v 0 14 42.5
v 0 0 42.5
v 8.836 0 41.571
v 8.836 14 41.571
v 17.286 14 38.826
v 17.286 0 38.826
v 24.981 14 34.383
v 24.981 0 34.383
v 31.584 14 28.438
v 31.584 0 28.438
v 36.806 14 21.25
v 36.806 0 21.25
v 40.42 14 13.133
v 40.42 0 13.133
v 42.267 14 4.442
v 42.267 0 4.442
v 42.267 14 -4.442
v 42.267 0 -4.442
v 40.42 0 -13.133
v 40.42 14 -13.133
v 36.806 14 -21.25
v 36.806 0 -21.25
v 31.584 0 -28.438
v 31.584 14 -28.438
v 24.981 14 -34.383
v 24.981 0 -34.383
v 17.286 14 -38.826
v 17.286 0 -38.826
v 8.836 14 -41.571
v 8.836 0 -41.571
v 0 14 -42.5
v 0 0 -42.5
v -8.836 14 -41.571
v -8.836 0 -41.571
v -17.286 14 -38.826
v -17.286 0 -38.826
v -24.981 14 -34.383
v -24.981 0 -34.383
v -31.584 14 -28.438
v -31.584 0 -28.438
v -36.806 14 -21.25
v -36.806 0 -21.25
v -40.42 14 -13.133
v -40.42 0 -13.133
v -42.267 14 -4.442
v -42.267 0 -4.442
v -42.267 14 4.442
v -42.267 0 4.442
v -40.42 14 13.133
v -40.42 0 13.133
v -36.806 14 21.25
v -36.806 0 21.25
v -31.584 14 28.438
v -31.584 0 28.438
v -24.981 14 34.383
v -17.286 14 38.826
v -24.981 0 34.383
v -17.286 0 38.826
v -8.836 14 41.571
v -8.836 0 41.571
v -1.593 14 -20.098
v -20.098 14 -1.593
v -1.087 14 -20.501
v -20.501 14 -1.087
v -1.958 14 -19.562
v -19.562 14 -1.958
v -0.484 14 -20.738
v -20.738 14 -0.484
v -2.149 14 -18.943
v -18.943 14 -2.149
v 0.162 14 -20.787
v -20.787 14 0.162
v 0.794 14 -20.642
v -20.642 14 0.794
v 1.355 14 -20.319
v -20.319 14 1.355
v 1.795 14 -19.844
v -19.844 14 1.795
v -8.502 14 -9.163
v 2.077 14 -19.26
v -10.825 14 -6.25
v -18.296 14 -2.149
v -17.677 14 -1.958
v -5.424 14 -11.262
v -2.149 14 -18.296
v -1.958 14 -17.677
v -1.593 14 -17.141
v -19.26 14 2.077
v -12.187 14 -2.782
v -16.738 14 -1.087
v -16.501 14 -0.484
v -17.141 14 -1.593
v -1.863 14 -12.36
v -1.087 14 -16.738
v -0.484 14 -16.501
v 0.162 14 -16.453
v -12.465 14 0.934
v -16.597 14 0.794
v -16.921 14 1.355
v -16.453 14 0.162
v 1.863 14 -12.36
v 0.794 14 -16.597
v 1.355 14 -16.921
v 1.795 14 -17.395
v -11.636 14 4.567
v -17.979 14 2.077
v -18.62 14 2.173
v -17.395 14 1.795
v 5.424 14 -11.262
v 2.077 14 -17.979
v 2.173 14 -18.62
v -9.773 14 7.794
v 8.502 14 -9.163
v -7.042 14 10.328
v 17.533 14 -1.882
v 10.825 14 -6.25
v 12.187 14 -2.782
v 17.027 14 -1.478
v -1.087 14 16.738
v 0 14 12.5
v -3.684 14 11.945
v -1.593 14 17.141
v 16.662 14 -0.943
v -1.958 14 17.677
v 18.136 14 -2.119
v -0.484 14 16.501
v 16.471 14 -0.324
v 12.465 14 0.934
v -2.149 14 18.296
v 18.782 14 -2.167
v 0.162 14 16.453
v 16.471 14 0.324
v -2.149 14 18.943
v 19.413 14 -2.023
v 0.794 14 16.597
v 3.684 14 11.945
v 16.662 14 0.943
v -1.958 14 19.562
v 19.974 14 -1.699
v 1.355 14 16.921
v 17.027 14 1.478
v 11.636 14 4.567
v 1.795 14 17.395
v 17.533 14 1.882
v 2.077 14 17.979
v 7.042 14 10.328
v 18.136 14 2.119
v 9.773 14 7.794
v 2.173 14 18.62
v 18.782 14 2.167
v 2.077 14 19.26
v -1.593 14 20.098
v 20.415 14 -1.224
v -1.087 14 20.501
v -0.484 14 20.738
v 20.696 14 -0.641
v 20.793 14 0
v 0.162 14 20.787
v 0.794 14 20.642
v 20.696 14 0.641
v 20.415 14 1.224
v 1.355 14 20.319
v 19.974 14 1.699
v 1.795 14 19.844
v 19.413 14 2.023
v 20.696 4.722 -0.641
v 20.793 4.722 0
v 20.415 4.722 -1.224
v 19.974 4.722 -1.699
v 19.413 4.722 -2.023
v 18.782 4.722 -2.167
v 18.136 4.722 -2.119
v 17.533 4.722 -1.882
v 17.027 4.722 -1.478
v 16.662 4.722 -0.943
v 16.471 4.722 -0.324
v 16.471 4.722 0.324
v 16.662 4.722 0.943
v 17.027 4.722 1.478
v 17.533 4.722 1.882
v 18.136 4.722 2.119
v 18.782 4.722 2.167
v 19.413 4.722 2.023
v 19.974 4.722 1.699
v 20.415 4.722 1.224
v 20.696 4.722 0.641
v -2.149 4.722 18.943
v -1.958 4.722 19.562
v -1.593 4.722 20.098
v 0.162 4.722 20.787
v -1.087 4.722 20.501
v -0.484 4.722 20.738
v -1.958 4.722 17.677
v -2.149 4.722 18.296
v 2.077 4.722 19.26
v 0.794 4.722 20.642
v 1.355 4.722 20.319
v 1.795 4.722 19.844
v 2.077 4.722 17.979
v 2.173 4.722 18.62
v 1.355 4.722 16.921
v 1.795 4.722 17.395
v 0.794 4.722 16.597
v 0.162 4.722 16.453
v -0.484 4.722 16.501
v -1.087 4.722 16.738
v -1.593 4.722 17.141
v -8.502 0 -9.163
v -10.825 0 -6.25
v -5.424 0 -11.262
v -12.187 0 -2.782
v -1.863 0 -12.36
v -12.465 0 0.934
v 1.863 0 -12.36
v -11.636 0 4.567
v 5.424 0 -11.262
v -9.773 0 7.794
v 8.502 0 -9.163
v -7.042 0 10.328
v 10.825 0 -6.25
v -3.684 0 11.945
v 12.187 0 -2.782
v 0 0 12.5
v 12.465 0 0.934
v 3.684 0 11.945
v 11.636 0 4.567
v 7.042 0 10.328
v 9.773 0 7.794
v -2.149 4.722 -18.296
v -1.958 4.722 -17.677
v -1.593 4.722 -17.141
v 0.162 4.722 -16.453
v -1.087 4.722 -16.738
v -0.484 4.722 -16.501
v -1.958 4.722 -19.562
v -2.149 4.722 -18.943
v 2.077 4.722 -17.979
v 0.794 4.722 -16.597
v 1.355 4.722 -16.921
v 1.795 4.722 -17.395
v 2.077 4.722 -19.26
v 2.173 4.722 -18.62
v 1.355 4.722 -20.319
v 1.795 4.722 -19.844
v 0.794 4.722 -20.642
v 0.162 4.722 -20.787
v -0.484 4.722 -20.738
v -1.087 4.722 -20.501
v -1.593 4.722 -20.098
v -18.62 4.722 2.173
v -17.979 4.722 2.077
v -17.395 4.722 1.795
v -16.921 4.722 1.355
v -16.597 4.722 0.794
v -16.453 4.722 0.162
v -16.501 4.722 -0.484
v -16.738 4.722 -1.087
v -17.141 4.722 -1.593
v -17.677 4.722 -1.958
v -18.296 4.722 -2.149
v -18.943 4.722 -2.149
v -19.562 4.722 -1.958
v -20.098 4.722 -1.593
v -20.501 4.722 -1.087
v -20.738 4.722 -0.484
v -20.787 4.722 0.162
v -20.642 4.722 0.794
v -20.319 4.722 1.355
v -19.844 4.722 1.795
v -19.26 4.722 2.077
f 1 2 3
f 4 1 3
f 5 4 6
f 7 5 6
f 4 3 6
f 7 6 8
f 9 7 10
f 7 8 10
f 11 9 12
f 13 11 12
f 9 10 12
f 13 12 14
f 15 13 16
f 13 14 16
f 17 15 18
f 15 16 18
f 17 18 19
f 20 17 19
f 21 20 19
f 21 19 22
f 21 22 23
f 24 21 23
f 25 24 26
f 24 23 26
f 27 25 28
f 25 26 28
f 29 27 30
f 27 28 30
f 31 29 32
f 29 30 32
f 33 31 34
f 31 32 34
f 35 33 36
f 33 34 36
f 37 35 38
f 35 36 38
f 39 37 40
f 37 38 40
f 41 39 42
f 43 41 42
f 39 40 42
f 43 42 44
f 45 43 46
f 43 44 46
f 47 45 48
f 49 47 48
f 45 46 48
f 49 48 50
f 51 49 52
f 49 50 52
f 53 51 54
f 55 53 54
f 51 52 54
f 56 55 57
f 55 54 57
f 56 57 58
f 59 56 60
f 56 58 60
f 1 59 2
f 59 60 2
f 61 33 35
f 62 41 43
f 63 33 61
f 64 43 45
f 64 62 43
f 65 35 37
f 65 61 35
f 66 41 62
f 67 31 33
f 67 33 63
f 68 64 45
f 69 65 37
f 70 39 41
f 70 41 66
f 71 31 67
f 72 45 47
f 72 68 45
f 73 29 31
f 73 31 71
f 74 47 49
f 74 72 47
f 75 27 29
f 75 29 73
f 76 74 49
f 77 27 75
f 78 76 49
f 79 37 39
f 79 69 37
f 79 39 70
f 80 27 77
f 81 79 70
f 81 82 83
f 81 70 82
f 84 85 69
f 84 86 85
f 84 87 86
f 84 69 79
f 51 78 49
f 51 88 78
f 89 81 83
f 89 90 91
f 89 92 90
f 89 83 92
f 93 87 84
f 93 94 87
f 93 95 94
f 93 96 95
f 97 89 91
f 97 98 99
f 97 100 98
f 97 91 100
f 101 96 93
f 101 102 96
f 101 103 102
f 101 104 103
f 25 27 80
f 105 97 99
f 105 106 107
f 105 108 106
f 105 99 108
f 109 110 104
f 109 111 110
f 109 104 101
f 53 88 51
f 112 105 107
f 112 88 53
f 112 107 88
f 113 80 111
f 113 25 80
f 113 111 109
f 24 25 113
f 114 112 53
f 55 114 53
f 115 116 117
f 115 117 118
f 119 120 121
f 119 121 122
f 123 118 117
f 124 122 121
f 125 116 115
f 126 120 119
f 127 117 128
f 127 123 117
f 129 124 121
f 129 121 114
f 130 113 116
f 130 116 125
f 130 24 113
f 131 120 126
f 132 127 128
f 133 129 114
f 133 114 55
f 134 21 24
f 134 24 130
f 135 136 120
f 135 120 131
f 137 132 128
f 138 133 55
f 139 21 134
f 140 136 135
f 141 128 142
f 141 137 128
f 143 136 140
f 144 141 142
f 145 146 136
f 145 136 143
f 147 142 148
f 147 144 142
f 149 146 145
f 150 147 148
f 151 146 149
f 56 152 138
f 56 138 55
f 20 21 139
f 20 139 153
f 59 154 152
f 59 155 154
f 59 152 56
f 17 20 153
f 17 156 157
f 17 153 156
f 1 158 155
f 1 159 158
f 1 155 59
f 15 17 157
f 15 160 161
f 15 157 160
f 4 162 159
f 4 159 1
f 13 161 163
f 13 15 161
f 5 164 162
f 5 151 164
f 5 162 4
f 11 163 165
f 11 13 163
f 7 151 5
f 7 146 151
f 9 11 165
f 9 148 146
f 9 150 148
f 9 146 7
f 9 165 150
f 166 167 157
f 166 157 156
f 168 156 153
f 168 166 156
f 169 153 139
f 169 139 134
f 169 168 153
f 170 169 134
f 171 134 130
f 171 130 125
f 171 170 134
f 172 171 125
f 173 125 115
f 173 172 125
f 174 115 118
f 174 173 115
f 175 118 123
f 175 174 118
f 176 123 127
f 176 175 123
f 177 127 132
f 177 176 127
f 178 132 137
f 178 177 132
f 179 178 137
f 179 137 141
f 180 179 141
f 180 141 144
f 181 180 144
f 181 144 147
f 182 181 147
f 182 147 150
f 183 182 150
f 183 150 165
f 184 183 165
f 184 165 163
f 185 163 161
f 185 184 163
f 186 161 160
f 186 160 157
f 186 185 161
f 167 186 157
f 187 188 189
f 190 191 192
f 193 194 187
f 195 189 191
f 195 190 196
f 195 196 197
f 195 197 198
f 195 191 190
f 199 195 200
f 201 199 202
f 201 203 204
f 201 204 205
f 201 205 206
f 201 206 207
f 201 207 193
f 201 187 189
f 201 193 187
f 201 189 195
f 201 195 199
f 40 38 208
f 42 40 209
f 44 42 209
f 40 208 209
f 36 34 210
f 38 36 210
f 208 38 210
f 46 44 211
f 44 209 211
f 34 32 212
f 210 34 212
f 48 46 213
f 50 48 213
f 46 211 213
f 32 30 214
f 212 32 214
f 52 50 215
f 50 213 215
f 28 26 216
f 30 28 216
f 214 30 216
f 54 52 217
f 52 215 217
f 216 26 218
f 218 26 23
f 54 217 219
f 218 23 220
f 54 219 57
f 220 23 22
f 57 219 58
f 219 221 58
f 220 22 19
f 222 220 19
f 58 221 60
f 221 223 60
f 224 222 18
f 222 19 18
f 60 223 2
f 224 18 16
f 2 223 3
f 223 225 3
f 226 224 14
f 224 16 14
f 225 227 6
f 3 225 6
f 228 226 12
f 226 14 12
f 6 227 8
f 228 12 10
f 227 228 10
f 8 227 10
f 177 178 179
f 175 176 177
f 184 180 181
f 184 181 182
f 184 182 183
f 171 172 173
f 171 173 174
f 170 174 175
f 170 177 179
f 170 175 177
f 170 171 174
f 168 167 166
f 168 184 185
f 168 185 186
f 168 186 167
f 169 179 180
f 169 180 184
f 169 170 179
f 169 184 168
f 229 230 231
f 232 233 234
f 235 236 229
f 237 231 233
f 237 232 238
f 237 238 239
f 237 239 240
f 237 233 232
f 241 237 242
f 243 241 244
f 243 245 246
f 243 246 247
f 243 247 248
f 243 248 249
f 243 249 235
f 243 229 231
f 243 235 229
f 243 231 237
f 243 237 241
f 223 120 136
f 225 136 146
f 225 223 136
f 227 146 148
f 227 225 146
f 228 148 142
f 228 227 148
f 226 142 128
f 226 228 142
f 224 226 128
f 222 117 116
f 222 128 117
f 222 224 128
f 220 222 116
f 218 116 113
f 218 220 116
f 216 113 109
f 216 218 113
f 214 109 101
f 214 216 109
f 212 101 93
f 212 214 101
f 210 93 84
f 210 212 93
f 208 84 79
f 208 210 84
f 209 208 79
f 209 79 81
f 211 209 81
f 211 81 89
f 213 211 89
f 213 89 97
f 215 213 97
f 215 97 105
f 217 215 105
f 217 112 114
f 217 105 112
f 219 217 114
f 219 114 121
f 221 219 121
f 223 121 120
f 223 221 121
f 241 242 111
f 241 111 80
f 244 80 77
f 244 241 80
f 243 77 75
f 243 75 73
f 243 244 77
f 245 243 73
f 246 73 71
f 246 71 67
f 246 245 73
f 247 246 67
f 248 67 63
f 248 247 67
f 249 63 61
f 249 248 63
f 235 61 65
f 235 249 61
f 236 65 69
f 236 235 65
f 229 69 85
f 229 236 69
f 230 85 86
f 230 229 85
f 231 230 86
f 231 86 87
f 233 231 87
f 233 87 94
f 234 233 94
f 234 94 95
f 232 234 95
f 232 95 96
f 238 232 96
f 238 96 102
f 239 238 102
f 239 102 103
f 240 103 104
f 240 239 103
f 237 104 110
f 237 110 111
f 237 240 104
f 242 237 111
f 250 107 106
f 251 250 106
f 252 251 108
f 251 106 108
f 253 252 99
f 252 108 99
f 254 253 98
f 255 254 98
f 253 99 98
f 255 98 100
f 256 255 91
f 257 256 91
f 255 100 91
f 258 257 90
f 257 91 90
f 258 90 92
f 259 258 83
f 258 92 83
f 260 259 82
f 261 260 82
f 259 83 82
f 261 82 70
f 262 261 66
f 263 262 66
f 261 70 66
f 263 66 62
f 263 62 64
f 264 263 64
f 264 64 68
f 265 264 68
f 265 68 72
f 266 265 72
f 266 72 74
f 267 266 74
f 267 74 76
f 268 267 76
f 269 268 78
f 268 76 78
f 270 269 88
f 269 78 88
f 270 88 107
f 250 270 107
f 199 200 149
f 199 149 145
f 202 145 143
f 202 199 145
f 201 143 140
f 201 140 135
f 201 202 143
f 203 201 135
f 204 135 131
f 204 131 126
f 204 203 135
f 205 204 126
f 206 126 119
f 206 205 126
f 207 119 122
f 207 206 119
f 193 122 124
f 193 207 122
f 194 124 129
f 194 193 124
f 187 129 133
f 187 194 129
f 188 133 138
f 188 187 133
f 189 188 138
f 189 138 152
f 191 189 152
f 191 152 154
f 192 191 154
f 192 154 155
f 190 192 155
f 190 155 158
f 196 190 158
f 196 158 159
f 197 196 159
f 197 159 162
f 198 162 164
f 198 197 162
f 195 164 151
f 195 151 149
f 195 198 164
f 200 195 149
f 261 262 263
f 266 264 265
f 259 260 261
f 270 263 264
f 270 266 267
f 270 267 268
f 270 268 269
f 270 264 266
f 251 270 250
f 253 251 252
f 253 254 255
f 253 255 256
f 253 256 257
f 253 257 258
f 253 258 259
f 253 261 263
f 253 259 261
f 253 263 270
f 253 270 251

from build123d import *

# Parameters (mm, degrees)
SKETCH1_R           = 42.5
BOSS_EXTRUDE1_DEPTH = 14
SKETCH2_R           = 12.5
CUT_EXTRUDE1_DEPTH  = 62.713045622
SKETCH3_R           = 2.173069289
CUT_EXTRUDE2_DEPTH  = 9.278215114
CIRPATTERN1_COUNT   = 4


with BuildPart() as part:
    # Sketch1 → Boss-Extrude1 (new body)
    with BuildSketch(Plane(origin=(0, 0, 0), x_dir=(1, 0, 0), z_dir=(0, 1, 0))):
        Circle(SKETCH1_R)
    extrude(amount=BOSS_EXTRUDE1_DEPTH)

    # Sketch2 → Cut-Extrude1 (cut, through all)
    with BuildSketch(Plane(origin=(0, 0, 0), x_dir=(1, 0, 0), z_dir=(0, 1, 0))):
        Circle(SKETCH2_R)
    extrude(amount=CUT_EXTRUDE1_DEPTH, mode=Mode.SUBTRACT)

    # Sketch3 → Cut-Extrude2 (cut)
    with BuildSketch(Plane(origin=(0, 14, 0), x_dir=(1, 0, 0), z_dir=(0, 1, 0))):
        with Locations((-18.619536516, 0)):
            Circle(SKETCH3_R)
    cut_extrude2 = extrude(amount=-CUT_EXTRUDE2_DEPTH, mode=Mode.SUBTRACT)

    # CirPattern1: Cut-Extrude2 ×4 about axis
    cirpattern1_axis = Axis((0, 0, 0), (0, 1, 0))
    for i in range(1, CIRPATTERN1_COUNT):
        add(cut_extrude2.rotate(cirpattern1_axis, i * 360 / CIRPATTERN1_COUNT), mode=Mode.SUBTRACT)


solid = part.part
